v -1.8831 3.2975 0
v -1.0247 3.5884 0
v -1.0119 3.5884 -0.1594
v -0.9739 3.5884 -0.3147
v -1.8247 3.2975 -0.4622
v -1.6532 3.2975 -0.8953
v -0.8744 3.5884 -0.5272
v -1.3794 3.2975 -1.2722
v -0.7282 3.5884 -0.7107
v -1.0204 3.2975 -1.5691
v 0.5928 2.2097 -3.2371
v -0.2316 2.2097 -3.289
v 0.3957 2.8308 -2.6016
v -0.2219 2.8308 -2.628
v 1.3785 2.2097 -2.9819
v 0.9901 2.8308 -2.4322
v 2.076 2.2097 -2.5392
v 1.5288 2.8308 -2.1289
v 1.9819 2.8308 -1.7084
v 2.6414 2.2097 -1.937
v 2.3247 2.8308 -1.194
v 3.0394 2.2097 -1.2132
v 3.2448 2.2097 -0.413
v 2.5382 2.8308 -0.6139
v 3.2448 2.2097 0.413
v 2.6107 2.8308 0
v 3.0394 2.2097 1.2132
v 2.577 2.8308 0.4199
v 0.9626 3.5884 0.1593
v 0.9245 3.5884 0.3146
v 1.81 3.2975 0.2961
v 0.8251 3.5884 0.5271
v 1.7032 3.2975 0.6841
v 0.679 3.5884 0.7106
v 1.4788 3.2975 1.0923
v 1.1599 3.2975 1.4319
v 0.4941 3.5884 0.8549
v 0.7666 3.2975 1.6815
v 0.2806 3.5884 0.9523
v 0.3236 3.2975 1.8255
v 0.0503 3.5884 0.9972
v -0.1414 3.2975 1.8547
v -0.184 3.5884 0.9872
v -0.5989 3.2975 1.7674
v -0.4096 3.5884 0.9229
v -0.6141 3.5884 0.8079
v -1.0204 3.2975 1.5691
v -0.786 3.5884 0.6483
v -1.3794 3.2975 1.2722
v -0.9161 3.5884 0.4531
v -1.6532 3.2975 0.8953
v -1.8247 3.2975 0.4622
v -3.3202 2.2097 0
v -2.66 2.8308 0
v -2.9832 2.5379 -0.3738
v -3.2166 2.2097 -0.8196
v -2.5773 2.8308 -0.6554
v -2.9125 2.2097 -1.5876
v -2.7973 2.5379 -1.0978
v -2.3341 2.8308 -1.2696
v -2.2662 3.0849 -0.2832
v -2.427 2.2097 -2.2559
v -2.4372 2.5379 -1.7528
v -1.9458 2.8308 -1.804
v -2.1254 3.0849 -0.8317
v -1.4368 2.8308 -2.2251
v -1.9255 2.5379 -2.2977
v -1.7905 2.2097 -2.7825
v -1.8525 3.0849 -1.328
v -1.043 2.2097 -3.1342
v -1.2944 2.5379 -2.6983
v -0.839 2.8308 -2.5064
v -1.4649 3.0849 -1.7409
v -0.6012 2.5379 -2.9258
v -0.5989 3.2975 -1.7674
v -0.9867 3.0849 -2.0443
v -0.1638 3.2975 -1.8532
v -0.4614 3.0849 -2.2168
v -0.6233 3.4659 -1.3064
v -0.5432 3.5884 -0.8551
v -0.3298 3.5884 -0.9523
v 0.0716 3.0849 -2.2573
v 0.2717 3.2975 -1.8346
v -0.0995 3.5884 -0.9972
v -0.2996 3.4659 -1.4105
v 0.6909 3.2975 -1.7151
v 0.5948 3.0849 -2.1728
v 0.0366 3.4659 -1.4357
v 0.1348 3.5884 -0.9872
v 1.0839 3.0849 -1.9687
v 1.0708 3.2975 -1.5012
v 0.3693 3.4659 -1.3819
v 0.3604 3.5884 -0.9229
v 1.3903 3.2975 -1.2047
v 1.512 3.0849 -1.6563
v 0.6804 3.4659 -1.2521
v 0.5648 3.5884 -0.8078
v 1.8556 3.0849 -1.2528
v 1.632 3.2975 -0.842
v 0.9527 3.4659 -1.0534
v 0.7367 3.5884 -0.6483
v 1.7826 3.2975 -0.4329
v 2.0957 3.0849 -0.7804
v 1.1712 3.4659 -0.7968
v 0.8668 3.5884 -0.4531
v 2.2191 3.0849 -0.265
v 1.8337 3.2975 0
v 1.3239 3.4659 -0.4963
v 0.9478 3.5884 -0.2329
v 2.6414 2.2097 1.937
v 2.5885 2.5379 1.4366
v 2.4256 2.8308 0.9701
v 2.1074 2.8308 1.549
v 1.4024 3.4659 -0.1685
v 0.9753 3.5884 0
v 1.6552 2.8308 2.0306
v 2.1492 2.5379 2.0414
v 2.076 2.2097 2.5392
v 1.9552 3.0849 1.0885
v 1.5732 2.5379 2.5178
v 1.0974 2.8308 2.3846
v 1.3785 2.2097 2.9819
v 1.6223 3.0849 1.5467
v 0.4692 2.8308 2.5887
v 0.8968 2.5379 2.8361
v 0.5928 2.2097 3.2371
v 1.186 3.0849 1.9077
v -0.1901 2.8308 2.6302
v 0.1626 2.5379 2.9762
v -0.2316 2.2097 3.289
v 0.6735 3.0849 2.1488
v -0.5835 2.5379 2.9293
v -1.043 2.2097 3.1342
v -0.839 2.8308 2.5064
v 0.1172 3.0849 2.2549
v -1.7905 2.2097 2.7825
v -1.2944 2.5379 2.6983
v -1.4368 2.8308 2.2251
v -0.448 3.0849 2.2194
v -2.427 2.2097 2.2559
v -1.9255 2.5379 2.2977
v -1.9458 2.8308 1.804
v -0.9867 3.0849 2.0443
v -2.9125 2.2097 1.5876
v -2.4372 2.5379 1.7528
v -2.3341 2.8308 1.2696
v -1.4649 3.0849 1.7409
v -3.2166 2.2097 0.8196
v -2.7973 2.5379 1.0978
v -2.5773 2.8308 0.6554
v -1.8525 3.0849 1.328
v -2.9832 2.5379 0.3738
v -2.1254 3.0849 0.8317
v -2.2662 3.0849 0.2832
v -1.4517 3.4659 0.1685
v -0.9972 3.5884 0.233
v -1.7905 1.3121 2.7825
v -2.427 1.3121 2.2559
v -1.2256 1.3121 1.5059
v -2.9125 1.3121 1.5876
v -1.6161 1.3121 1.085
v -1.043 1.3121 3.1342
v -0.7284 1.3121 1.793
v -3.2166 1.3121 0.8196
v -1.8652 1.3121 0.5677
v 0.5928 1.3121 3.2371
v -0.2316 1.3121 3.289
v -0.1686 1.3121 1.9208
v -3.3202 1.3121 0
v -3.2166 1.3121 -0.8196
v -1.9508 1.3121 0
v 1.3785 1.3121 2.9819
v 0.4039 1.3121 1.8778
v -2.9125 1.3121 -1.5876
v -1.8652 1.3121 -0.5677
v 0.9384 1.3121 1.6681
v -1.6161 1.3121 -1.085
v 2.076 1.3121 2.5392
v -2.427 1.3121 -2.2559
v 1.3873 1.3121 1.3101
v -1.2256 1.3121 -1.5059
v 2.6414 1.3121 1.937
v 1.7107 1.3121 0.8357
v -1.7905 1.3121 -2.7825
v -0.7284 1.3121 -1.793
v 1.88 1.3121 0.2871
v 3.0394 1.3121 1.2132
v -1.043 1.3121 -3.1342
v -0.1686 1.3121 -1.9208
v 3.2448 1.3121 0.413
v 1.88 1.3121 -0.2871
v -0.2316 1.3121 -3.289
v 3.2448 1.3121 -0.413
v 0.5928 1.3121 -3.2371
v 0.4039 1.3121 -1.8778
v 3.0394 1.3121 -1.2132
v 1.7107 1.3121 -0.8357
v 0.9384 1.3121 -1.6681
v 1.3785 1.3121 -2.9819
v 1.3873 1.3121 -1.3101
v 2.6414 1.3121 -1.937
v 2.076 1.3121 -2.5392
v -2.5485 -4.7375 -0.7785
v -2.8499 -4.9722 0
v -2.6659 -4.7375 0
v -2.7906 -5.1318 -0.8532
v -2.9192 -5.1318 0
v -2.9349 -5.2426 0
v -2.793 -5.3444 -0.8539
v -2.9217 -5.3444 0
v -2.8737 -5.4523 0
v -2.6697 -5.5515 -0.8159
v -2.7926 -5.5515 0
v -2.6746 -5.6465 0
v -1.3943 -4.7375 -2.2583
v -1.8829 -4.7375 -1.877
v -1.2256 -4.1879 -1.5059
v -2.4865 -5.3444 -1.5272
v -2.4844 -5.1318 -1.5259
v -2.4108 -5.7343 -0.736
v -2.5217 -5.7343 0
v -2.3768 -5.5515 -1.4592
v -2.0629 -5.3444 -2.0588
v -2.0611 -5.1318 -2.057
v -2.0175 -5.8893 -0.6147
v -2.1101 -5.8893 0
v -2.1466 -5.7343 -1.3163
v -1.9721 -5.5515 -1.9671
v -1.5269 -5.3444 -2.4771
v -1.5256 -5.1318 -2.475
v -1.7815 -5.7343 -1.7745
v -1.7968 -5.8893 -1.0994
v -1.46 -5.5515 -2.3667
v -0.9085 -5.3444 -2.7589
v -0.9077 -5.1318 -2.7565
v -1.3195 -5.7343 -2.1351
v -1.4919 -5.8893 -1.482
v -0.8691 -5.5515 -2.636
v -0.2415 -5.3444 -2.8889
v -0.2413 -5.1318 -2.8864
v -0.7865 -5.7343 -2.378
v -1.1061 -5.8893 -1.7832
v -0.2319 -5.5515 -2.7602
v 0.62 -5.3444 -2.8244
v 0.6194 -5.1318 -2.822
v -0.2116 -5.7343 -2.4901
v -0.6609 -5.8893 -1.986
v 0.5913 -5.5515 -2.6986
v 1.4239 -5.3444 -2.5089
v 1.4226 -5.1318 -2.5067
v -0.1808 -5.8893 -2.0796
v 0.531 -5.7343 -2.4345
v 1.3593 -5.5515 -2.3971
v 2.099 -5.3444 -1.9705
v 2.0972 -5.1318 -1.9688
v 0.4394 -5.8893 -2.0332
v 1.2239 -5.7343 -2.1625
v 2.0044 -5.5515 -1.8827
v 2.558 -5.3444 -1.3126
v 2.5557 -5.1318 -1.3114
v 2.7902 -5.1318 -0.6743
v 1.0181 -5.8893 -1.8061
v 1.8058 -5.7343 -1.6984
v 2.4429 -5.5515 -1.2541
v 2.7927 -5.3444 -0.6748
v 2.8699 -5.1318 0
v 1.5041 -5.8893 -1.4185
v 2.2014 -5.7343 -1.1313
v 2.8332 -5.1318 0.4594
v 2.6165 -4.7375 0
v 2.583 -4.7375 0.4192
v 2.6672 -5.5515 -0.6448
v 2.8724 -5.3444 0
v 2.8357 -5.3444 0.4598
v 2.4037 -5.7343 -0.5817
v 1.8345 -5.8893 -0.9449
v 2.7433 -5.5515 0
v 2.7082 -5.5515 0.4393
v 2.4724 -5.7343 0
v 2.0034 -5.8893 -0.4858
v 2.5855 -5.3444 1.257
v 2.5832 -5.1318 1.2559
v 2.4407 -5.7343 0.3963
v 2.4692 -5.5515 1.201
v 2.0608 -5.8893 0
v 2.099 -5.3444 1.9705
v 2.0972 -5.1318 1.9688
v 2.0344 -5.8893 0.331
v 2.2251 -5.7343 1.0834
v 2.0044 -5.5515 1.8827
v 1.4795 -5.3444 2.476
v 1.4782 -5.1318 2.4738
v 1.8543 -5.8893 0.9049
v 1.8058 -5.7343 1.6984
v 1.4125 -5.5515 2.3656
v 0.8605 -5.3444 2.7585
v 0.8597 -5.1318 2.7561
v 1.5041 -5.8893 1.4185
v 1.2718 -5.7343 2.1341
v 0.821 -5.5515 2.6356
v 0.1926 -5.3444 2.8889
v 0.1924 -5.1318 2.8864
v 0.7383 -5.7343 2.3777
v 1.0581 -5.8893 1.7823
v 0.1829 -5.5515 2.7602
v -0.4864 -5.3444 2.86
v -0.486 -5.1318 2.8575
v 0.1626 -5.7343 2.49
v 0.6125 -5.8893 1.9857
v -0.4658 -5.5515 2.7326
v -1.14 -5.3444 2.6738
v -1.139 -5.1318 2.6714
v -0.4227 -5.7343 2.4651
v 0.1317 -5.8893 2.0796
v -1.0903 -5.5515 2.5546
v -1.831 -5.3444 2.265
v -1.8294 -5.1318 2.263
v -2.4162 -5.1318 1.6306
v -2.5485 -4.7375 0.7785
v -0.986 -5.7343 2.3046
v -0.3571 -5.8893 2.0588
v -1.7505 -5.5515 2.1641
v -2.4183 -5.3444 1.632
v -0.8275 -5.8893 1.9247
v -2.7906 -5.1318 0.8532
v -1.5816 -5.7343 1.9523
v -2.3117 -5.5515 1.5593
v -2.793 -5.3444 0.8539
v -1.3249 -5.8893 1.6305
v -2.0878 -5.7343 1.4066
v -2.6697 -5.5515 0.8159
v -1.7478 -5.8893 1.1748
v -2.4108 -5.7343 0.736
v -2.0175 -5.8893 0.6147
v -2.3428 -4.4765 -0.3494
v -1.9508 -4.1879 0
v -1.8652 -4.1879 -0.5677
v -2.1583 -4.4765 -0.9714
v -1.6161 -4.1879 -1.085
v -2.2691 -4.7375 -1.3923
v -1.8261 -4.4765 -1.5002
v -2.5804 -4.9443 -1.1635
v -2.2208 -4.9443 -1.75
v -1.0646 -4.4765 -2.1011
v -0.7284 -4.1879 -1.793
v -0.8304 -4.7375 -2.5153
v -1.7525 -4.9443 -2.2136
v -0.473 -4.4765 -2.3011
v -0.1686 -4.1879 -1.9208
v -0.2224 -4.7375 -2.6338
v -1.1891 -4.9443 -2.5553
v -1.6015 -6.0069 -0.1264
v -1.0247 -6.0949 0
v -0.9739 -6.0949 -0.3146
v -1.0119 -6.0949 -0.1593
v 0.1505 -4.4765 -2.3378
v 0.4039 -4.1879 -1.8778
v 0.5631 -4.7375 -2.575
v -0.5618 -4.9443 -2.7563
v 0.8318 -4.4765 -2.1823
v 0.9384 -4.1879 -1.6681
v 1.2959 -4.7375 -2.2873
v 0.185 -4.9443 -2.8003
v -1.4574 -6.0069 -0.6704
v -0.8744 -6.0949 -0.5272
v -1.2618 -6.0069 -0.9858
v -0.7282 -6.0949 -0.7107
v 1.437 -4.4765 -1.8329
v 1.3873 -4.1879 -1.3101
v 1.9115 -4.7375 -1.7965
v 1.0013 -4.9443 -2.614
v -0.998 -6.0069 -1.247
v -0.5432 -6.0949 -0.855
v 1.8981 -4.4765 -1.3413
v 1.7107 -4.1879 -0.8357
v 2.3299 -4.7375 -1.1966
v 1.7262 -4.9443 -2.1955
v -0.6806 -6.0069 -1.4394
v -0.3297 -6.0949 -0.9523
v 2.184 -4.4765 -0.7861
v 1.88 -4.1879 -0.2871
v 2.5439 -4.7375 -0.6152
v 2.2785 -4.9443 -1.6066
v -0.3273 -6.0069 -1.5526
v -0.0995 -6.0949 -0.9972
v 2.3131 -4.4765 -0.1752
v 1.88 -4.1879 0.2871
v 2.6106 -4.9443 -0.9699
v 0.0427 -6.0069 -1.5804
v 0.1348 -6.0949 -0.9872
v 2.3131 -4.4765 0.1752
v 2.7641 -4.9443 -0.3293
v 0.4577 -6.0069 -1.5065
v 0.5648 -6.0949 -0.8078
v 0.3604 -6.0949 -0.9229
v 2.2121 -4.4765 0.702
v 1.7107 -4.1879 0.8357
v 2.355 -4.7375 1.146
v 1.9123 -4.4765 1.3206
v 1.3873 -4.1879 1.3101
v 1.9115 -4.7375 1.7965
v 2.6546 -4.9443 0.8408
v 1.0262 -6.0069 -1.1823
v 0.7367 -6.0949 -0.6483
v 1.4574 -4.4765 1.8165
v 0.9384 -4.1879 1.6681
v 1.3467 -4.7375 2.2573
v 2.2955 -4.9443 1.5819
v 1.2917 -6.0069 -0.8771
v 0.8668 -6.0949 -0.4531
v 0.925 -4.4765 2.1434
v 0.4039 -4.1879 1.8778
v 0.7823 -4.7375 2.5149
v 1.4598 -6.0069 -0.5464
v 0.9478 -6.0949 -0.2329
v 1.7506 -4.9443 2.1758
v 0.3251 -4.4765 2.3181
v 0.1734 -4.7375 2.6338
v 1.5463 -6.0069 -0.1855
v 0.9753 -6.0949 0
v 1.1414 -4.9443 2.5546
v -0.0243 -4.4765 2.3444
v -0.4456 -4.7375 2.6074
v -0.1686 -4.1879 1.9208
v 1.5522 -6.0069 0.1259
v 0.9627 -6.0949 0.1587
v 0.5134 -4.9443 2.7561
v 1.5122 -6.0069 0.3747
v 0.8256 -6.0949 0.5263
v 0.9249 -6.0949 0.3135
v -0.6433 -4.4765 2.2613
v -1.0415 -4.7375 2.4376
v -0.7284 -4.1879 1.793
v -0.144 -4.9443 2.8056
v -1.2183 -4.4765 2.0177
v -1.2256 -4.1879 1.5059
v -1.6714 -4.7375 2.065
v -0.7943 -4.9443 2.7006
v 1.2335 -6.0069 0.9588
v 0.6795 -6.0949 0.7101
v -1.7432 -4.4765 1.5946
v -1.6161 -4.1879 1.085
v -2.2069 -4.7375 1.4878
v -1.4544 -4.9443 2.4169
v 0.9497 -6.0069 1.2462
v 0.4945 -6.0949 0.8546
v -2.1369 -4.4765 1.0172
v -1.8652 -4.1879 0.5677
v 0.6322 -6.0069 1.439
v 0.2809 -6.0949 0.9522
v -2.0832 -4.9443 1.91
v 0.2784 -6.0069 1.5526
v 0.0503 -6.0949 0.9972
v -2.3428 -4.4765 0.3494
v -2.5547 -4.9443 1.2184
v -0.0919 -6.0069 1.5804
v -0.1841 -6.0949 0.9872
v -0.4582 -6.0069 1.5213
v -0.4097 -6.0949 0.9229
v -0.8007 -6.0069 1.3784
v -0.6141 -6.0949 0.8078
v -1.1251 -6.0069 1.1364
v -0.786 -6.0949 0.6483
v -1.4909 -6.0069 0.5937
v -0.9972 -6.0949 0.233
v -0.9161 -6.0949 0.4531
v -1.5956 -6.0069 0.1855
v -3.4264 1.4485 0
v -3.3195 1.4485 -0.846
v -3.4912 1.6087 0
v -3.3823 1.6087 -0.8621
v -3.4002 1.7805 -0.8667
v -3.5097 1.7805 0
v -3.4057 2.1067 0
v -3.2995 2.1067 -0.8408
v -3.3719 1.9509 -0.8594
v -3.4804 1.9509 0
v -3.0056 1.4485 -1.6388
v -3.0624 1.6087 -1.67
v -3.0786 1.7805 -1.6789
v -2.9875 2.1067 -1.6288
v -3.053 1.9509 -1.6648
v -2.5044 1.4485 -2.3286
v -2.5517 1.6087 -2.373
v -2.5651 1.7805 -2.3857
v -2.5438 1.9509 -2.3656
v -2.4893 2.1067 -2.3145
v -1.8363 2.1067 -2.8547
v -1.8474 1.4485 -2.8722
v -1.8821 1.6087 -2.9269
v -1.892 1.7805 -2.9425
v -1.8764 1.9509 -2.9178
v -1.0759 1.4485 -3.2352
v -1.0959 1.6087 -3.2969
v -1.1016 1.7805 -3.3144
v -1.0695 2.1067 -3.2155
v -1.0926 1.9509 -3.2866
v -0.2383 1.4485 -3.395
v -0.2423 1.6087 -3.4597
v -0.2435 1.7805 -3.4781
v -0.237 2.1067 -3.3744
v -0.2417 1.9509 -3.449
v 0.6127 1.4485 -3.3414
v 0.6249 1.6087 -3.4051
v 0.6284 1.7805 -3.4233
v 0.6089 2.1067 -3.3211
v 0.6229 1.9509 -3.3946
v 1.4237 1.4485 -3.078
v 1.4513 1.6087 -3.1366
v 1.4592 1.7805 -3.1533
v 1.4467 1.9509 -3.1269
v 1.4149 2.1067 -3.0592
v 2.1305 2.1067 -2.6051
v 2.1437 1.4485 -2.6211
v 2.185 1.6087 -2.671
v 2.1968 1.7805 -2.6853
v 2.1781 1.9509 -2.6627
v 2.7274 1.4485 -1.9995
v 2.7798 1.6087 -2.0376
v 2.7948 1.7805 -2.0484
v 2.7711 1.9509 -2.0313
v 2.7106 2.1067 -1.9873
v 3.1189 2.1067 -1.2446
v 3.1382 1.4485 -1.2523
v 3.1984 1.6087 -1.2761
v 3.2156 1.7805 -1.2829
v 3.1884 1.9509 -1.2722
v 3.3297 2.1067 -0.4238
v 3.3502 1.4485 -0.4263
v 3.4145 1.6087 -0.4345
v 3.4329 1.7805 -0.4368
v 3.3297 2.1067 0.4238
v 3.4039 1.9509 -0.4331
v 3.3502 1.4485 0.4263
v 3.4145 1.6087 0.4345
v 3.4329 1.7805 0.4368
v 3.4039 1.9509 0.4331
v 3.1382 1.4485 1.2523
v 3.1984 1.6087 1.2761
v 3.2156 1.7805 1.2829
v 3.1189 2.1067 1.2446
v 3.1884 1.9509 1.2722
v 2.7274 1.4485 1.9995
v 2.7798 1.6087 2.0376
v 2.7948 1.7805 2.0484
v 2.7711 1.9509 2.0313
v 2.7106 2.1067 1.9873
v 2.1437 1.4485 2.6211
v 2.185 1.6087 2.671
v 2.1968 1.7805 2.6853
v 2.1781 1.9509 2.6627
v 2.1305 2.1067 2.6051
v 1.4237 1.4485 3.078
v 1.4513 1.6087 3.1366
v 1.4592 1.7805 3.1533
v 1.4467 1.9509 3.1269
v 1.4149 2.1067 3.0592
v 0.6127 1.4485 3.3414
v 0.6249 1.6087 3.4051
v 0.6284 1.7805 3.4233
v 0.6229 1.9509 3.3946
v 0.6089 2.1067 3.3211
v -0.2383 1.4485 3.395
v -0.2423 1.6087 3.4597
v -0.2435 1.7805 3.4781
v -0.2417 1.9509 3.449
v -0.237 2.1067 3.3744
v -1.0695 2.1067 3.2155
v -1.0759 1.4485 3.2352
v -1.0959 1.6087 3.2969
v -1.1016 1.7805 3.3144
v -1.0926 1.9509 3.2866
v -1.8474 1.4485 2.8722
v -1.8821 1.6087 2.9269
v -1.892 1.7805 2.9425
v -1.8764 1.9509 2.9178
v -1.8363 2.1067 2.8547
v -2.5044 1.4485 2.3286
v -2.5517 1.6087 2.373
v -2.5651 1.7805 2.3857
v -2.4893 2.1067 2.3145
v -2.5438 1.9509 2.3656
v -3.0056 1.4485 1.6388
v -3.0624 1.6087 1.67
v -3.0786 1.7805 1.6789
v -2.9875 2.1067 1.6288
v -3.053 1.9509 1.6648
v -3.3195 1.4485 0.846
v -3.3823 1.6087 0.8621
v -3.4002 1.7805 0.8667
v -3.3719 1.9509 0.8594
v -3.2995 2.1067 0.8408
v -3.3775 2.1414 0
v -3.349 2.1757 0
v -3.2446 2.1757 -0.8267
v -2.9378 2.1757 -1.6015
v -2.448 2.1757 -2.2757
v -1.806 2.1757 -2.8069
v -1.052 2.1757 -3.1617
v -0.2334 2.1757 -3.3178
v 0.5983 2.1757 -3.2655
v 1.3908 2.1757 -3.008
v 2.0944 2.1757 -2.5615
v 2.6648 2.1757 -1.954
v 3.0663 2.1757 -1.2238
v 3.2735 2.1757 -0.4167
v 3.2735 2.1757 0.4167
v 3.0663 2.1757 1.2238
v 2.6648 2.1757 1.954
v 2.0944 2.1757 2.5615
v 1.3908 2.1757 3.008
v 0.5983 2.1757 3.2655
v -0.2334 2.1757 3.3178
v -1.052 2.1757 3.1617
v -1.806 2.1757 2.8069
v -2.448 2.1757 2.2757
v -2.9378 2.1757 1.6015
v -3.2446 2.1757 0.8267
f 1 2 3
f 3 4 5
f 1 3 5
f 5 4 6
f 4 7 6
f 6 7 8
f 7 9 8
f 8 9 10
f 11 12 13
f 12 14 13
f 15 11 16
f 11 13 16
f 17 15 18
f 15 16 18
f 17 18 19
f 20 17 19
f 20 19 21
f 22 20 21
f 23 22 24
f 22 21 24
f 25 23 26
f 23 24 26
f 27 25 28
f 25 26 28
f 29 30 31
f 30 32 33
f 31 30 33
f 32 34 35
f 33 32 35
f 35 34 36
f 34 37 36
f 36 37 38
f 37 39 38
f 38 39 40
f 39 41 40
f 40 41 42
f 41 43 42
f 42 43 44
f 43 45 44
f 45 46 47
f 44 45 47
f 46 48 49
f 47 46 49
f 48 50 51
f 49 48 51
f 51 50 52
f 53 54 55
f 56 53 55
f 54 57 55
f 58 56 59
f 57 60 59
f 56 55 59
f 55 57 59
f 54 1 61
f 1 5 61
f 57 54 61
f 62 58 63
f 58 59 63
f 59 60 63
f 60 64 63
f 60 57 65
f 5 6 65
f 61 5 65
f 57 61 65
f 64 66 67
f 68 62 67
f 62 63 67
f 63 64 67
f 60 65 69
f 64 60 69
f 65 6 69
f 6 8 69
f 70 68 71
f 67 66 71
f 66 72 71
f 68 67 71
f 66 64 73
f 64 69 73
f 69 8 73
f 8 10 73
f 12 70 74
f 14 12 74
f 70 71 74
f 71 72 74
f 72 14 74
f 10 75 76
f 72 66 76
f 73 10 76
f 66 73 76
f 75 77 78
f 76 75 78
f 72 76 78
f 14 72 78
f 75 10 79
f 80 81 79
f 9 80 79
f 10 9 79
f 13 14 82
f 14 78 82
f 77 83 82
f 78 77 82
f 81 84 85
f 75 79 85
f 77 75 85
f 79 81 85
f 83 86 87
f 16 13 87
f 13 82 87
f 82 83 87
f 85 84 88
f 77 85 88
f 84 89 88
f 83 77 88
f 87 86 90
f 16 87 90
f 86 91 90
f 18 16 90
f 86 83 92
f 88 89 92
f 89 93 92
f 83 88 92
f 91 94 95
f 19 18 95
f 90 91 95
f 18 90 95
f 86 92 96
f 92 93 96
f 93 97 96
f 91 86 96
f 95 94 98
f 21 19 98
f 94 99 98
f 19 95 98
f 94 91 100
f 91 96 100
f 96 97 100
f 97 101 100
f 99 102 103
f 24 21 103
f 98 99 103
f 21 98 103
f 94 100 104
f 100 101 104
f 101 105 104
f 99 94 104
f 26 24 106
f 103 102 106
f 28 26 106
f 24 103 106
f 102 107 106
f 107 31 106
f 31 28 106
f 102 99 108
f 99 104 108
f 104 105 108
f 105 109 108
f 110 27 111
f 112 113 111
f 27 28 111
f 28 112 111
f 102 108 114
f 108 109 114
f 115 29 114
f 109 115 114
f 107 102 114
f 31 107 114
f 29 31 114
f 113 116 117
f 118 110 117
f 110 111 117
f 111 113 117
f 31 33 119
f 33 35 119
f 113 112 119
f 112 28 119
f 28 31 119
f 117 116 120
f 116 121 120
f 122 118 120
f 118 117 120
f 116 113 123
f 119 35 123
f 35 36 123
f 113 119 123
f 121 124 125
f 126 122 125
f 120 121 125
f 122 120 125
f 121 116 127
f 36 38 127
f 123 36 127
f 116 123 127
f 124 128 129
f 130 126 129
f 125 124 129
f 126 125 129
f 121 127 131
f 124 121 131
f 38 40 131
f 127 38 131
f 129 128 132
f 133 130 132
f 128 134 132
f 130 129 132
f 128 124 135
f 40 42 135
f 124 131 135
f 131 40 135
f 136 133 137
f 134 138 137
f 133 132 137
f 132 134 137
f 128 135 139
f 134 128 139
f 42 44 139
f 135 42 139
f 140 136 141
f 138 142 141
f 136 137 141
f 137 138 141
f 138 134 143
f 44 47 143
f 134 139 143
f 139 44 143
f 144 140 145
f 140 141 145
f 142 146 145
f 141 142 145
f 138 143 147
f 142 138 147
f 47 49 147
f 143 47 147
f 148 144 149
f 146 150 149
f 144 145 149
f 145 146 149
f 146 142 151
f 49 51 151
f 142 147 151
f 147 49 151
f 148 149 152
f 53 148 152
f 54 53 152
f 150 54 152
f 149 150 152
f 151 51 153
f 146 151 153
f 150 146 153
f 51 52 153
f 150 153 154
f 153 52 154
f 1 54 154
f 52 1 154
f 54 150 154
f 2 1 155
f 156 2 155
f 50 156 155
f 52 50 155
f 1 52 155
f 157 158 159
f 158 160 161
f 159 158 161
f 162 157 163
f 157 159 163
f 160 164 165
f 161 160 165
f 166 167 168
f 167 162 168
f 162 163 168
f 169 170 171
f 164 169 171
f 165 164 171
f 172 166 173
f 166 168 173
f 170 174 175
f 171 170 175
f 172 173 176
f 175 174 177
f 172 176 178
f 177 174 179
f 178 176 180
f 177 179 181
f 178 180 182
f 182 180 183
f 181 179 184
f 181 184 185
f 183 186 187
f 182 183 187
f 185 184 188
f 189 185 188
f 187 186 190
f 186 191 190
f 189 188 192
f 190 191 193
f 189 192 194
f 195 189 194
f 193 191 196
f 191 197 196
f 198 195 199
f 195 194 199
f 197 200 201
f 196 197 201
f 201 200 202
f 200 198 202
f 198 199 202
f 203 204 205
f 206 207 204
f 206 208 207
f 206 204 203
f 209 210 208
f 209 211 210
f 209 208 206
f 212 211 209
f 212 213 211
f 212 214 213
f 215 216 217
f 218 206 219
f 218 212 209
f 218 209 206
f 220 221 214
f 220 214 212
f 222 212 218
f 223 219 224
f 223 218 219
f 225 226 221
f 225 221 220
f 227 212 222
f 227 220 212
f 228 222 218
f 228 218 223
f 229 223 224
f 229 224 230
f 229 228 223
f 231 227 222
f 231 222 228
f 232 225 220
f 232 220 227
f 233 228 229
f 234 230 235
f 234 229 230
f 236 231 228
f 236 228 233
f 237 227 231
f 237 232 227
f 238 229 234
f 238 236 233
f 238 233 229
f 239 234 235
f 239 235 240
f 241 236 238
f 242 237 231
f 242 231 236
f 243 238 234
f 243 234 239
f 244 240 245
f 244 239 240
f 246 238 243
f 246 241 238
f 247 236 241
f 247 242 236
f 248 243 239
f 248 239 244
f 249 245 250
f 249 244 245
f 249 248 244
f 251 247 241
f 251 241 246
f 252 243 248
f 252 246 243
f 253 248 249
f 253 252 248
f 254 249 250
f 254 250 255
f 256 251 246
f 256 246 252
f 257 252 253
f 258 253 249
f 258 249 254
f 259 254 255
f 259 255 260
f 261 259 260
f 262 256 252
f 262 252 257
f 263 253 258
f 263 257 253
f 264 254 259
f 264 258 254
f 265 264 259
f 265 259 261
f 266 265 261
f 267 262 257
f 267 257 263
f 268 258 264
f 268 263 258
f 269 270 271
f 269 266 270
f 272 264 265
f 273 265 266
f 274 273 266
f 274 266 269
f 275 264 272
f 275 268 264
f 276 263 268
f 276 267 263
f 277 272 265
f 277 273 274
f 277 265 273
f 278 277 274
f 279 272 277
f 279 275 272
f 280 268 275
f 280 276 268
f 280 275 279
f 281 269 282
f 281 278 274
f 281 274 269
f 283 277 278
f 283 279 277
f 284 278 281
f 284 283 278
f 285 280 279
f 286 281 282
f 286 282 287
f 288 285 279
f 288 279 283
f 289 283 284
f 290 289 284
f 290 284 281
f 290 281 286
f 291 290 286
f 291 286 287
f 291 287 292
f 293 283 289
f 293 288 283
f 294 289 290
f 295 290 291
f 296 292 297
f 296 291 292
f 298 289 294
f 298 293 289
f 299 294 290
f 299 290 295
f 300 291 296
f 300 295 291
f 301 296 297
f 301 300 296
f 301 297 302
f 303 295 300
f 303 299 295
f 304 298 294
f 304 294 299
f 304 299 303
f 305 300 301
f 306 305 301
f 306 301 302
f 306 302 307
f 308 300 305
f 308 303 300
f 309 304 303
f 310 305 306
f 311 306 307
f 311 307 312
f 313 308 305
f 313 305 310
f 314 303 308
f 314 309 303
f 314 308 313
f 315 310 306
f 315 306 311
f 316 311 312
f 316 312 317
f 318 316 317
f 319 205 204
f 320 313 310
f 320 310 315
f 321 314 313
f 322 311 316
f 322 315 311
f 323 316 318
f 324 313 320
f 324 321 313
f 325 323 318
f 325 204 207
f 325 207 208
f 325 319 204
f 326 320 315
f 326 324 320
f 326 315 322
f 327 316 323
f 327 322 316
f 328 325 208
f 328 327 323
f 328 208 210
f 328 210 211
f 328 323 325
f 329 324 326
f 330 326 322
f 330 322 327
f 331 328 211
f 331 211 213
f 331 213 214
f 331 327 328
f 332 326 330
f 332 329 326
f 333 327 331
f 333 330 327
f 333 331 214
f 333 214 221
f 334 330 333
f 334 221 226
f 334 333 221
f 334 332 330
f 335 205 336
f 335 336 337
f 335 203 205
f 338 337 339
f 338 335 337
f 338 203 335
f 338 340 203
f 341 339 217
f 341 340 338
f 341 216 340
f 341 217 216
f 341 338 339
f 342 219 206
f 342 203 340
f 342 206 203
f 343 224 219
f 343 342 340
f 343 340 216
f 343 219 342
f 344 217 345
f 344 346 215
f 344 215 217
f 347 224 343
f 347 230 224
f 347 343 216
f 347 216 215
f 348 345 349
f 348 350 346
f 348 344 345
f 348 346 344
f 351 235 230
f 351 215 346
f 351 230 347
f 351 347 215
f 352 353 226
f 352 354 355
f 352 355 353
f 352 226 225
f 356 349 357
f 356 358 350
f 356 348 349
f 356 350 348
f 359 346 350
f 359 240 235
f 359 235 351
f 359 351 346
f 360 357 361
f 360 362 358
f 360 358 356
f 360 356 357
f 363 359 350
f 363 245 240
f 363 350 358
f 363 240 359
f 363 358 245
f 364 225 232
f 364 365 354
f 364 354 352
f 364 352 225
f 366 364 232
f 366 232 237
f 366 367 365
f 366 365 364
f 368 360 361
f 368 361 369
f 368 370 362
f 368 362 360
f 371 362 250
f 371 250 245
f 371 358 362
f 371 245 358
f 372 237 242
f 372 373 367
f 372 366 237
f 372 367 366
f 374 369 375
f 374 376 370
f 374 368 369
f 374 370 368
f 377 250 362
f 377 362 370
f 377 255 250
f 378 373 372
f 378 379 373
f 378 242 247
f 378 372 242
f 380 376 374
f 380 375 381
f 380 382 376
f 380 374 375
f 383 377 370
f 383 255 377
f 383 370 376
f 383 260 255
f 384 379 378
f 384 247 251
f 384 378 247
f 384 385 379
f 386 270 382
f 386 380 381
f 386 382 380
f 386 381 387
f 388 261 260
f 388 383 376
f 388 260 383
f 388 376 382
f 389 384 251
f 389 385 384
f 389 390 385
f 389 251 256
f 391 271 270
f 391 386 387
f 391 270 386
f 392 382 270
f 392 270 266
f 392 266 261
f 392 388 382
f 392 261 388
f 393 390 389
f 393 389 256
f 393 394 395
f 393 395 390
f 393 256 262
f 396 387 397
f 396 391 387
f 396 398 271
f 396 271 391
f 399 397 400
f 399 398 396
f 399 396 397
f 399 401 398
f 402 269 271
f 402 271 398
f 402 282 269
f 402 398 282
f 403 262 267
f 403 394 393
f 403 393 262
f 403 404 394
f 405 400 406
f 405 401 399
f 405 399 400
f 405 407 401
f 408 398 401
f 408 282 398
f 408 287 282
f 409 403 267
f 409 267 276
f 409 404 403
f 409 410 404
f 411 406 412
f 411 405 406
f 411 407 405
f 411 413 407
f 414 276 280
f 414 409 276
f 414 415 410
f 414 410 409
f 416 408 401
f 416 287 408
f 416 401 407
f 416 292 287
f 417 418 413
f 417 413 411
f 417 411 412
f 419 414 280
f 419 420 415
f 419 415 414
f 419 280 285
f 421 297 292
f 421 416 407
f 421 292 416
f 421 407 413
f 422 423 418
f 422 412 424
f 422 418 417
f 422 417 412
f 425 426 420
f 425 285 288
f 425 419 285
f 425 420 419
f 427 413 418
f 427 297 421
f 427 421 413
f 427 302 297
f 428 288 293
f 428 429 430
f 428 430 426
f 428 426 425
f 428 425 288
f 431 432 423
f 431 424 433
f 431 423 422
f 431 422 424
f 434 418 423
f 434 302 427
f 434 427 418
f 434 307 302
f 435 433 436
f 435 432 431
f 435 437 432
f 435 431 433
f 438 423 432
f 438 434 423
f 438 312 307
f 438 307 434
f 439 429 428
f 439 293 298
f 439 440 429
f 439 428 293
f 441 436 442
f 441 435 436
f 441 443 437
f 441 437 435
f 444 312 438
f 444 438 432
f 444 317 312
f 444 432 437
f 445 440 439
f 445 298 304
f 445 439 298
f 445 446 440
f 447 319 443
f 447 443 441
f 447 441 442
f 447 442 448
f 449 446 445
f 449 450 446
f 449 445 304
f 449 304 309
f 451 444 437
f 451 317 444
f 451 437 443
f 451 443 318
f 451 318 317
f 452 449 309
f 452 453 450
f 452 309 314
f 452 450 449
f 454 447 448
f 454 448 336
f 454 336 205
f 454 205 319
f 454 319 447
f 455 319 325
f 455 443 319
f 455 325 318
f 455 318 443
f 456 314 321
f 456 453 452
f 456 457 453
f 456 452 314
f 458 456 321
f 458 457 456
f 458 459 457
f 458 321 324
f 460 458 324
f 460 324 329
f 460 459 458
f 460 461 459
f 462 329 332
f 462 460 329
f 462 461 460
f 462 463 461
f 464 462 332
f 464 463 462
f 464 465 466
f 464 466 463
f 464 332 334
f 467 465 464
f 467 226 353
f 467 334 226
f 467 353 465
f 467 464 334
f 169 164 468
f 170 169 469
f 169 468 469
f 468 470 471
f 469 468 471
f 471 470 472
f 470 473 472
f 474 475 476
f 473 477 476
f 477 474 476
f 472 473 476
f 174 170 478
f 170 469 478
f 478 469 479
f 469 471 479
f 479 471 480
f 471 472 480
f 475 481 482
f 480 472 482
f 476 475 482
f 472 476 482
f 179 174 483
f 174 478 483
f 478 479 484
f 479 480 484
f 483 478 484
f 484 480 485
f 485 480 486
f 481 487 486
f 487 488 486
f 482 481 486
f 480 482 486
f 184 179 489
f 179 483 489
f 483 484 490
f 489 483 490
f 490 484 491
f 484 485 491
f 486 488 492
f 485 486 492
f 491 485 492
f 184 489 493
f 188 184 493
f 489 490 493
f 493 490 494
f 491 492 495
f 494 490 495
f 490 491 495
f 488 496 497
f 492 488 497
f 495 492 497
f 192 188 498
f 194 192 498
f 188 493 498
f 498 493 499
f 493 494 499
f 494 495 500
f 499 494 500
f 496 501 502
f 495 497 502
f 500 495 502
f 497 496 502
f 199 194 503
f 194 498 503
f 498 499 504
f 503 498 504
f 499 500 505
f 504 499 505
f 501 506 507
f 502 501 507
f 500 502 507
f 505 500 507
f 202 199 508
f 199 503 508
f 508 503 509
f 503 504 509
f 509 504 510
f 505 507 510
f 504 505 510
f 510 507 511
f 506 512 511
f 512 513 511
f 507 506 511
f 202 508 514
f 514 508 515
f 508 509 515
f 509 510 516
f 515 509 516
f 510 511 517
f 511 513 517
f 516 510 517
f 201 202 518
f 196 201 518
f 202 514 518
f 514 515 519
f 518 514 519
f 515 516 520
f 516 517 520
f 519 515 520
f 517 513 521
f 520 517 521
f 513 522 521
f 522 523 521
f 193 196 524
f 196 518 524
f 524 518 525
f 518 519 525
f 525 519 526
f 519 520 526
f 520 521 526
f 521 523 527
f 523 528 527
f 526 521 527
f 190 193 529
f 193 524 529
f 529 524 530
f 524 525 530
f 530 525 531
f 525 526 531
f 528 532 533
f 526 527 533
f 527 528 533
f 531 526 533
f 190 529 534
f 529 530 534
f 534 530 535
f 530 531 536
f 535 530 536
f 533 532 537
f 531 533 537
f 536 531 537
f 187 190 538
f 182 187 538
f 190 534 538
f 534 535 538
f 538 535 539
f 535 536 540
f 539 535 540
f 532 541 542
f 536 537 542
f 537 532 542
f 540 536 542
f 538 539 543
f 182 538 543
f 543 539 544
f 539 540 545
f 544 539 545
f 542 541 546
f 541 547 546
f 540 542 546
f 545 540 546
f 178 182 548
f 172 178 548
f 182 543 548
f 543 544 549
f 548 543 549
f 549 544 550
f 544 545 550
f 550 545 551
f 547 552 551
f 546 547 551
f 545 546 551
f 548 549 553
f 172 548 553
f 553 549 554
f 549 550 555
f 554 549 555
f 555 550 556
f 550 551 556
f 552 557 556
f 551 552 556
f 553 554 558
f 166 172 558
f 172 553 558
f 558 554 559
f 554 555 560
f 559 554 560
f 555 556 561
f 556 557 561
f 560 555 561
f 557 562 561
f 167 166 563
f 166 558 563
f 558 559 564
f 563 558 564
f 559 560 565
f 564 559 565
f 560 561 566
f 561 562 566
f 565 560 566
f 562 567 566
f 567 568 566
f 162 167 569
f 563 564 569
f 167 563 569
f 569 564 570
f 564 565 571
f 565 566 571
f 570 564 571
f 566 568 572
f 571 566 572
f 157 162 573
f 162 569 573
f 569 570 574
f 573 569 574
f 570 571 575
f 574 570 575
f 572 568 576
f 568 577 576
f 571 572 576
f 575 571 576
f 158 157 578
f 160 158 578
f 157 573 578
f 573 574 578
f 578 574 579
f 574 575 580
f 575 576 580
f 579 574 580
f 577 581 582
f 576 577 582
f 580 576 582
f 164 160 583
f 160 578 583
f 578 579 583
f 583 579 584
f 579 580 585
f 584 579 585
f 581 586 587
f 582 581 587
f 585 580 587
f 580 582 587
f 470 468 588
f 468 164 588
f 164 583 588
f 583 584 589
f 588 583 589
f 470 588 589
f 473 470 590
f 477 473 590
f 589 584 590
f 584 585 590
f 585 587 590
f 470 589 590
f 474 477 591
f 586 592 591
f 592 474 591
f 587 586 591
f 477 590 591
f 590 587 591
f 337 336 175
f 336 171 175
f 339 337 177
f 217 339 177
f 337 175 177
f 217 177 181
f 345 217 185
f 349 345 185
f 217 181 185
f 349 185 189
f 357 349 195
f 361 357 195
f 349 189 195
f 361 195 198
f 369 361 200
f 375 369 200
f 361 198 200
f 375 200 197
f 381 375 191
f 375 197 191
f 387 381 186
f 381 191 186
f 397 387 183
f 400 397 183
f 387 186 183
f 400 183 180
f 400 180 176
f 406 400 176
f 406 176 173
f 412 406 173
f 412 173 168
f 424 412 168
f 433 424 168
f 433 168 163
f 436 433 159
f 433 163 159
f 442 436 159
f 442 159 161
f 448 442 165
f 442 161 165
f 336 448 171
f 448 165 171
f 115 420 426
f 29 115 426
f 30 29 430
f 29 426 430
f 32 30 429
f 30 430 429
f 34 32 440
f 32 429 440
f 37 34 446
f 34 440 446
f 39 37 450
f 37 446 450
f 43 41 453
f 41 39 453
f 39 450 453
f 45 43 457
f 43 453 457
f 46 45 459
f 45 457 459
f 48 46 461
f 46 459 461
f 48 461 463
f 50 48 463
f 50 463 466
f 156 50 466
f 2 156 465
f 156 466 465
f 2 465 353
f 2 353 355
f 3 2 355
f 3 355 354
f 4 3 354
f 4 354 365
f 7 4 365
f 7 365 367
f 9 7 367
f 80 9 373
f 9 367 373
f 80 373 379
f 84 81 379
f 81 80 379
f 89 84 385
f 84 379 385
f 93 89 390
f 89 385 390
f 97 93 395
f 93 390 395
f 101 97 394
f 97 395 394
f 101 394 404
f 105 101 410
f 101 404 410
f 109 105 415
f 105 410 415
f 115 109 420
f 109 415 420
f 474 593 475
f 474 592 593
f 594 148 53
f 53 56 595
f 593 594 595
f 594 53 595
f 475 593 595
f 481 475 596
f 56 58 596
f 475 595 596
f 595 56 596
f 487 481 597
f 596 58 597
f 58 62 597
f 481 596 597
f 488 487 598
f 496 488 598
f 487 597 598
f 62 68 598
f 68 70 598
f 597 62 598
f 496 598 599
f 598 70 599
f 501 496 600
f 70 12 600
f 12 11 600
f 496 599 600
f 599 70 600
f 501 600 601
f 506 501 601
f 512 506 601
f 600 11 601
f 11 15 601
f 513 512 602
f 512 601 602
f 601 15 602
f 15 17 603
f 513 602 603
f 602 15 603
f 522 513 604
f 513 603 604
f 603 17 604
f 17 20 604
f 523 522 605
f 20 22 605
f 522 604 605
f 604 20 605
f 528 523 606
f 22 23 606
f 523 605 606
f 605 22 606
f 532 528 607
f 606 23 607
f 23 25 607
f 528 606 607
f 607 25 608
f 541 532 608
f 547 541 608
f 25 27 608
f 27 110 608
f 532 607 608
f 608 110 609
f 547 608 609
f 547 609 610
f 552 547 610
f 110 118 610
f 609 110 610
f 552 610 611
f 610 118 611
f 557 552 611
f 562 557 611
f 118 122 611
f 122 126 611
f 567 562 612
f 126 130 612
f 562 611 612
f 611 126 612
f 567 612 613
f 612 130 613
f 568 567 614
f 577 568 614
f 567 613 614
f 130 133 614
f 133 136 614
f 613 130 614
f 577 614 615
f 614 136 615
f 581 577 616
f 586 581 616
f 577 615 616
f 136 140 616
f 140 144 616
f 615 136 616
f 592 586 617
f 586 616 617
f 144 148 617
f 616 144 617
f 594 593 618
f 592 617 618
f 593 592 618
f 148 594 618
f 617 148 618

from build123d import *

# Parameters (mm, degrees)
SKETCH2_R          = 1
CUT_EXTRUDE2_DEPTH = 12.020949889


with BuildPart() as part:
    # Sketch1 → Revolve1 (revolve)
    with BuildSketch(Plane.XY, mode=Mode.PRIVATE) as revolve1_sk:
        with BuildLine():
            add(Edge.make_bspline(
                [(1.901469747, -4.187890833), (3.997803393, -5.505352851), (2.40138715, -6.003675185), (0.316595481, -6.158045679)],
                knots=[0, 0, 0, 0, 1, 1, 1, 1], degree=3))
            Line((1.901469747, -4.187890833), (1.901469747, 1.312109167))
            Line((1.901469747, 1.312109167), (3.270835138, 1.312109167))
            ThreePointArc((3.270835138, 1.312109167), (3.457066196, 1.693980285), (3.356353959, 2.106732757))
            ThreePointArc((3.356353959, 2.106732757), (3.314000681, 2.158555901), (3.270835138, 2.209704452))
            ThreePointArc((3.270835138, 2.209704452), (1.788504548, 3.318079362), (-0.024669059, 3.689832486))
            Line((-0.024669059, 3.689832486), (-0.024669059, -6.158045679))
            Line((-0.024669059, -6.158045679), (0.316595481, -6.158045679))
        make_face()
    revolve(revolve1_sk.sketch.rotate(Axis((-0.024669059, -4.1454e-05, 0), (0, -1, 0)), 180), axis=Axis((-0.024669059, -4.1454e-05, 0), (0, -1, 0)))

    # Sketch2 → Cut-Extrude2 (cut, through all)
    with BuildSketch(Plane(origin=(0, -6.158045679, 0), x_dir=(-1, 0, 0), z_dir=(0, -1, 0))):
        with Locations(Location((0.024669059, 0, 0), (0, 0, 180))):
            Circle(SKETCH2_R)
    extrude(amount=-CUT_EXTRUDE2_DEPTH, mode=Mode.SUBTRACT)


solid = part.part
